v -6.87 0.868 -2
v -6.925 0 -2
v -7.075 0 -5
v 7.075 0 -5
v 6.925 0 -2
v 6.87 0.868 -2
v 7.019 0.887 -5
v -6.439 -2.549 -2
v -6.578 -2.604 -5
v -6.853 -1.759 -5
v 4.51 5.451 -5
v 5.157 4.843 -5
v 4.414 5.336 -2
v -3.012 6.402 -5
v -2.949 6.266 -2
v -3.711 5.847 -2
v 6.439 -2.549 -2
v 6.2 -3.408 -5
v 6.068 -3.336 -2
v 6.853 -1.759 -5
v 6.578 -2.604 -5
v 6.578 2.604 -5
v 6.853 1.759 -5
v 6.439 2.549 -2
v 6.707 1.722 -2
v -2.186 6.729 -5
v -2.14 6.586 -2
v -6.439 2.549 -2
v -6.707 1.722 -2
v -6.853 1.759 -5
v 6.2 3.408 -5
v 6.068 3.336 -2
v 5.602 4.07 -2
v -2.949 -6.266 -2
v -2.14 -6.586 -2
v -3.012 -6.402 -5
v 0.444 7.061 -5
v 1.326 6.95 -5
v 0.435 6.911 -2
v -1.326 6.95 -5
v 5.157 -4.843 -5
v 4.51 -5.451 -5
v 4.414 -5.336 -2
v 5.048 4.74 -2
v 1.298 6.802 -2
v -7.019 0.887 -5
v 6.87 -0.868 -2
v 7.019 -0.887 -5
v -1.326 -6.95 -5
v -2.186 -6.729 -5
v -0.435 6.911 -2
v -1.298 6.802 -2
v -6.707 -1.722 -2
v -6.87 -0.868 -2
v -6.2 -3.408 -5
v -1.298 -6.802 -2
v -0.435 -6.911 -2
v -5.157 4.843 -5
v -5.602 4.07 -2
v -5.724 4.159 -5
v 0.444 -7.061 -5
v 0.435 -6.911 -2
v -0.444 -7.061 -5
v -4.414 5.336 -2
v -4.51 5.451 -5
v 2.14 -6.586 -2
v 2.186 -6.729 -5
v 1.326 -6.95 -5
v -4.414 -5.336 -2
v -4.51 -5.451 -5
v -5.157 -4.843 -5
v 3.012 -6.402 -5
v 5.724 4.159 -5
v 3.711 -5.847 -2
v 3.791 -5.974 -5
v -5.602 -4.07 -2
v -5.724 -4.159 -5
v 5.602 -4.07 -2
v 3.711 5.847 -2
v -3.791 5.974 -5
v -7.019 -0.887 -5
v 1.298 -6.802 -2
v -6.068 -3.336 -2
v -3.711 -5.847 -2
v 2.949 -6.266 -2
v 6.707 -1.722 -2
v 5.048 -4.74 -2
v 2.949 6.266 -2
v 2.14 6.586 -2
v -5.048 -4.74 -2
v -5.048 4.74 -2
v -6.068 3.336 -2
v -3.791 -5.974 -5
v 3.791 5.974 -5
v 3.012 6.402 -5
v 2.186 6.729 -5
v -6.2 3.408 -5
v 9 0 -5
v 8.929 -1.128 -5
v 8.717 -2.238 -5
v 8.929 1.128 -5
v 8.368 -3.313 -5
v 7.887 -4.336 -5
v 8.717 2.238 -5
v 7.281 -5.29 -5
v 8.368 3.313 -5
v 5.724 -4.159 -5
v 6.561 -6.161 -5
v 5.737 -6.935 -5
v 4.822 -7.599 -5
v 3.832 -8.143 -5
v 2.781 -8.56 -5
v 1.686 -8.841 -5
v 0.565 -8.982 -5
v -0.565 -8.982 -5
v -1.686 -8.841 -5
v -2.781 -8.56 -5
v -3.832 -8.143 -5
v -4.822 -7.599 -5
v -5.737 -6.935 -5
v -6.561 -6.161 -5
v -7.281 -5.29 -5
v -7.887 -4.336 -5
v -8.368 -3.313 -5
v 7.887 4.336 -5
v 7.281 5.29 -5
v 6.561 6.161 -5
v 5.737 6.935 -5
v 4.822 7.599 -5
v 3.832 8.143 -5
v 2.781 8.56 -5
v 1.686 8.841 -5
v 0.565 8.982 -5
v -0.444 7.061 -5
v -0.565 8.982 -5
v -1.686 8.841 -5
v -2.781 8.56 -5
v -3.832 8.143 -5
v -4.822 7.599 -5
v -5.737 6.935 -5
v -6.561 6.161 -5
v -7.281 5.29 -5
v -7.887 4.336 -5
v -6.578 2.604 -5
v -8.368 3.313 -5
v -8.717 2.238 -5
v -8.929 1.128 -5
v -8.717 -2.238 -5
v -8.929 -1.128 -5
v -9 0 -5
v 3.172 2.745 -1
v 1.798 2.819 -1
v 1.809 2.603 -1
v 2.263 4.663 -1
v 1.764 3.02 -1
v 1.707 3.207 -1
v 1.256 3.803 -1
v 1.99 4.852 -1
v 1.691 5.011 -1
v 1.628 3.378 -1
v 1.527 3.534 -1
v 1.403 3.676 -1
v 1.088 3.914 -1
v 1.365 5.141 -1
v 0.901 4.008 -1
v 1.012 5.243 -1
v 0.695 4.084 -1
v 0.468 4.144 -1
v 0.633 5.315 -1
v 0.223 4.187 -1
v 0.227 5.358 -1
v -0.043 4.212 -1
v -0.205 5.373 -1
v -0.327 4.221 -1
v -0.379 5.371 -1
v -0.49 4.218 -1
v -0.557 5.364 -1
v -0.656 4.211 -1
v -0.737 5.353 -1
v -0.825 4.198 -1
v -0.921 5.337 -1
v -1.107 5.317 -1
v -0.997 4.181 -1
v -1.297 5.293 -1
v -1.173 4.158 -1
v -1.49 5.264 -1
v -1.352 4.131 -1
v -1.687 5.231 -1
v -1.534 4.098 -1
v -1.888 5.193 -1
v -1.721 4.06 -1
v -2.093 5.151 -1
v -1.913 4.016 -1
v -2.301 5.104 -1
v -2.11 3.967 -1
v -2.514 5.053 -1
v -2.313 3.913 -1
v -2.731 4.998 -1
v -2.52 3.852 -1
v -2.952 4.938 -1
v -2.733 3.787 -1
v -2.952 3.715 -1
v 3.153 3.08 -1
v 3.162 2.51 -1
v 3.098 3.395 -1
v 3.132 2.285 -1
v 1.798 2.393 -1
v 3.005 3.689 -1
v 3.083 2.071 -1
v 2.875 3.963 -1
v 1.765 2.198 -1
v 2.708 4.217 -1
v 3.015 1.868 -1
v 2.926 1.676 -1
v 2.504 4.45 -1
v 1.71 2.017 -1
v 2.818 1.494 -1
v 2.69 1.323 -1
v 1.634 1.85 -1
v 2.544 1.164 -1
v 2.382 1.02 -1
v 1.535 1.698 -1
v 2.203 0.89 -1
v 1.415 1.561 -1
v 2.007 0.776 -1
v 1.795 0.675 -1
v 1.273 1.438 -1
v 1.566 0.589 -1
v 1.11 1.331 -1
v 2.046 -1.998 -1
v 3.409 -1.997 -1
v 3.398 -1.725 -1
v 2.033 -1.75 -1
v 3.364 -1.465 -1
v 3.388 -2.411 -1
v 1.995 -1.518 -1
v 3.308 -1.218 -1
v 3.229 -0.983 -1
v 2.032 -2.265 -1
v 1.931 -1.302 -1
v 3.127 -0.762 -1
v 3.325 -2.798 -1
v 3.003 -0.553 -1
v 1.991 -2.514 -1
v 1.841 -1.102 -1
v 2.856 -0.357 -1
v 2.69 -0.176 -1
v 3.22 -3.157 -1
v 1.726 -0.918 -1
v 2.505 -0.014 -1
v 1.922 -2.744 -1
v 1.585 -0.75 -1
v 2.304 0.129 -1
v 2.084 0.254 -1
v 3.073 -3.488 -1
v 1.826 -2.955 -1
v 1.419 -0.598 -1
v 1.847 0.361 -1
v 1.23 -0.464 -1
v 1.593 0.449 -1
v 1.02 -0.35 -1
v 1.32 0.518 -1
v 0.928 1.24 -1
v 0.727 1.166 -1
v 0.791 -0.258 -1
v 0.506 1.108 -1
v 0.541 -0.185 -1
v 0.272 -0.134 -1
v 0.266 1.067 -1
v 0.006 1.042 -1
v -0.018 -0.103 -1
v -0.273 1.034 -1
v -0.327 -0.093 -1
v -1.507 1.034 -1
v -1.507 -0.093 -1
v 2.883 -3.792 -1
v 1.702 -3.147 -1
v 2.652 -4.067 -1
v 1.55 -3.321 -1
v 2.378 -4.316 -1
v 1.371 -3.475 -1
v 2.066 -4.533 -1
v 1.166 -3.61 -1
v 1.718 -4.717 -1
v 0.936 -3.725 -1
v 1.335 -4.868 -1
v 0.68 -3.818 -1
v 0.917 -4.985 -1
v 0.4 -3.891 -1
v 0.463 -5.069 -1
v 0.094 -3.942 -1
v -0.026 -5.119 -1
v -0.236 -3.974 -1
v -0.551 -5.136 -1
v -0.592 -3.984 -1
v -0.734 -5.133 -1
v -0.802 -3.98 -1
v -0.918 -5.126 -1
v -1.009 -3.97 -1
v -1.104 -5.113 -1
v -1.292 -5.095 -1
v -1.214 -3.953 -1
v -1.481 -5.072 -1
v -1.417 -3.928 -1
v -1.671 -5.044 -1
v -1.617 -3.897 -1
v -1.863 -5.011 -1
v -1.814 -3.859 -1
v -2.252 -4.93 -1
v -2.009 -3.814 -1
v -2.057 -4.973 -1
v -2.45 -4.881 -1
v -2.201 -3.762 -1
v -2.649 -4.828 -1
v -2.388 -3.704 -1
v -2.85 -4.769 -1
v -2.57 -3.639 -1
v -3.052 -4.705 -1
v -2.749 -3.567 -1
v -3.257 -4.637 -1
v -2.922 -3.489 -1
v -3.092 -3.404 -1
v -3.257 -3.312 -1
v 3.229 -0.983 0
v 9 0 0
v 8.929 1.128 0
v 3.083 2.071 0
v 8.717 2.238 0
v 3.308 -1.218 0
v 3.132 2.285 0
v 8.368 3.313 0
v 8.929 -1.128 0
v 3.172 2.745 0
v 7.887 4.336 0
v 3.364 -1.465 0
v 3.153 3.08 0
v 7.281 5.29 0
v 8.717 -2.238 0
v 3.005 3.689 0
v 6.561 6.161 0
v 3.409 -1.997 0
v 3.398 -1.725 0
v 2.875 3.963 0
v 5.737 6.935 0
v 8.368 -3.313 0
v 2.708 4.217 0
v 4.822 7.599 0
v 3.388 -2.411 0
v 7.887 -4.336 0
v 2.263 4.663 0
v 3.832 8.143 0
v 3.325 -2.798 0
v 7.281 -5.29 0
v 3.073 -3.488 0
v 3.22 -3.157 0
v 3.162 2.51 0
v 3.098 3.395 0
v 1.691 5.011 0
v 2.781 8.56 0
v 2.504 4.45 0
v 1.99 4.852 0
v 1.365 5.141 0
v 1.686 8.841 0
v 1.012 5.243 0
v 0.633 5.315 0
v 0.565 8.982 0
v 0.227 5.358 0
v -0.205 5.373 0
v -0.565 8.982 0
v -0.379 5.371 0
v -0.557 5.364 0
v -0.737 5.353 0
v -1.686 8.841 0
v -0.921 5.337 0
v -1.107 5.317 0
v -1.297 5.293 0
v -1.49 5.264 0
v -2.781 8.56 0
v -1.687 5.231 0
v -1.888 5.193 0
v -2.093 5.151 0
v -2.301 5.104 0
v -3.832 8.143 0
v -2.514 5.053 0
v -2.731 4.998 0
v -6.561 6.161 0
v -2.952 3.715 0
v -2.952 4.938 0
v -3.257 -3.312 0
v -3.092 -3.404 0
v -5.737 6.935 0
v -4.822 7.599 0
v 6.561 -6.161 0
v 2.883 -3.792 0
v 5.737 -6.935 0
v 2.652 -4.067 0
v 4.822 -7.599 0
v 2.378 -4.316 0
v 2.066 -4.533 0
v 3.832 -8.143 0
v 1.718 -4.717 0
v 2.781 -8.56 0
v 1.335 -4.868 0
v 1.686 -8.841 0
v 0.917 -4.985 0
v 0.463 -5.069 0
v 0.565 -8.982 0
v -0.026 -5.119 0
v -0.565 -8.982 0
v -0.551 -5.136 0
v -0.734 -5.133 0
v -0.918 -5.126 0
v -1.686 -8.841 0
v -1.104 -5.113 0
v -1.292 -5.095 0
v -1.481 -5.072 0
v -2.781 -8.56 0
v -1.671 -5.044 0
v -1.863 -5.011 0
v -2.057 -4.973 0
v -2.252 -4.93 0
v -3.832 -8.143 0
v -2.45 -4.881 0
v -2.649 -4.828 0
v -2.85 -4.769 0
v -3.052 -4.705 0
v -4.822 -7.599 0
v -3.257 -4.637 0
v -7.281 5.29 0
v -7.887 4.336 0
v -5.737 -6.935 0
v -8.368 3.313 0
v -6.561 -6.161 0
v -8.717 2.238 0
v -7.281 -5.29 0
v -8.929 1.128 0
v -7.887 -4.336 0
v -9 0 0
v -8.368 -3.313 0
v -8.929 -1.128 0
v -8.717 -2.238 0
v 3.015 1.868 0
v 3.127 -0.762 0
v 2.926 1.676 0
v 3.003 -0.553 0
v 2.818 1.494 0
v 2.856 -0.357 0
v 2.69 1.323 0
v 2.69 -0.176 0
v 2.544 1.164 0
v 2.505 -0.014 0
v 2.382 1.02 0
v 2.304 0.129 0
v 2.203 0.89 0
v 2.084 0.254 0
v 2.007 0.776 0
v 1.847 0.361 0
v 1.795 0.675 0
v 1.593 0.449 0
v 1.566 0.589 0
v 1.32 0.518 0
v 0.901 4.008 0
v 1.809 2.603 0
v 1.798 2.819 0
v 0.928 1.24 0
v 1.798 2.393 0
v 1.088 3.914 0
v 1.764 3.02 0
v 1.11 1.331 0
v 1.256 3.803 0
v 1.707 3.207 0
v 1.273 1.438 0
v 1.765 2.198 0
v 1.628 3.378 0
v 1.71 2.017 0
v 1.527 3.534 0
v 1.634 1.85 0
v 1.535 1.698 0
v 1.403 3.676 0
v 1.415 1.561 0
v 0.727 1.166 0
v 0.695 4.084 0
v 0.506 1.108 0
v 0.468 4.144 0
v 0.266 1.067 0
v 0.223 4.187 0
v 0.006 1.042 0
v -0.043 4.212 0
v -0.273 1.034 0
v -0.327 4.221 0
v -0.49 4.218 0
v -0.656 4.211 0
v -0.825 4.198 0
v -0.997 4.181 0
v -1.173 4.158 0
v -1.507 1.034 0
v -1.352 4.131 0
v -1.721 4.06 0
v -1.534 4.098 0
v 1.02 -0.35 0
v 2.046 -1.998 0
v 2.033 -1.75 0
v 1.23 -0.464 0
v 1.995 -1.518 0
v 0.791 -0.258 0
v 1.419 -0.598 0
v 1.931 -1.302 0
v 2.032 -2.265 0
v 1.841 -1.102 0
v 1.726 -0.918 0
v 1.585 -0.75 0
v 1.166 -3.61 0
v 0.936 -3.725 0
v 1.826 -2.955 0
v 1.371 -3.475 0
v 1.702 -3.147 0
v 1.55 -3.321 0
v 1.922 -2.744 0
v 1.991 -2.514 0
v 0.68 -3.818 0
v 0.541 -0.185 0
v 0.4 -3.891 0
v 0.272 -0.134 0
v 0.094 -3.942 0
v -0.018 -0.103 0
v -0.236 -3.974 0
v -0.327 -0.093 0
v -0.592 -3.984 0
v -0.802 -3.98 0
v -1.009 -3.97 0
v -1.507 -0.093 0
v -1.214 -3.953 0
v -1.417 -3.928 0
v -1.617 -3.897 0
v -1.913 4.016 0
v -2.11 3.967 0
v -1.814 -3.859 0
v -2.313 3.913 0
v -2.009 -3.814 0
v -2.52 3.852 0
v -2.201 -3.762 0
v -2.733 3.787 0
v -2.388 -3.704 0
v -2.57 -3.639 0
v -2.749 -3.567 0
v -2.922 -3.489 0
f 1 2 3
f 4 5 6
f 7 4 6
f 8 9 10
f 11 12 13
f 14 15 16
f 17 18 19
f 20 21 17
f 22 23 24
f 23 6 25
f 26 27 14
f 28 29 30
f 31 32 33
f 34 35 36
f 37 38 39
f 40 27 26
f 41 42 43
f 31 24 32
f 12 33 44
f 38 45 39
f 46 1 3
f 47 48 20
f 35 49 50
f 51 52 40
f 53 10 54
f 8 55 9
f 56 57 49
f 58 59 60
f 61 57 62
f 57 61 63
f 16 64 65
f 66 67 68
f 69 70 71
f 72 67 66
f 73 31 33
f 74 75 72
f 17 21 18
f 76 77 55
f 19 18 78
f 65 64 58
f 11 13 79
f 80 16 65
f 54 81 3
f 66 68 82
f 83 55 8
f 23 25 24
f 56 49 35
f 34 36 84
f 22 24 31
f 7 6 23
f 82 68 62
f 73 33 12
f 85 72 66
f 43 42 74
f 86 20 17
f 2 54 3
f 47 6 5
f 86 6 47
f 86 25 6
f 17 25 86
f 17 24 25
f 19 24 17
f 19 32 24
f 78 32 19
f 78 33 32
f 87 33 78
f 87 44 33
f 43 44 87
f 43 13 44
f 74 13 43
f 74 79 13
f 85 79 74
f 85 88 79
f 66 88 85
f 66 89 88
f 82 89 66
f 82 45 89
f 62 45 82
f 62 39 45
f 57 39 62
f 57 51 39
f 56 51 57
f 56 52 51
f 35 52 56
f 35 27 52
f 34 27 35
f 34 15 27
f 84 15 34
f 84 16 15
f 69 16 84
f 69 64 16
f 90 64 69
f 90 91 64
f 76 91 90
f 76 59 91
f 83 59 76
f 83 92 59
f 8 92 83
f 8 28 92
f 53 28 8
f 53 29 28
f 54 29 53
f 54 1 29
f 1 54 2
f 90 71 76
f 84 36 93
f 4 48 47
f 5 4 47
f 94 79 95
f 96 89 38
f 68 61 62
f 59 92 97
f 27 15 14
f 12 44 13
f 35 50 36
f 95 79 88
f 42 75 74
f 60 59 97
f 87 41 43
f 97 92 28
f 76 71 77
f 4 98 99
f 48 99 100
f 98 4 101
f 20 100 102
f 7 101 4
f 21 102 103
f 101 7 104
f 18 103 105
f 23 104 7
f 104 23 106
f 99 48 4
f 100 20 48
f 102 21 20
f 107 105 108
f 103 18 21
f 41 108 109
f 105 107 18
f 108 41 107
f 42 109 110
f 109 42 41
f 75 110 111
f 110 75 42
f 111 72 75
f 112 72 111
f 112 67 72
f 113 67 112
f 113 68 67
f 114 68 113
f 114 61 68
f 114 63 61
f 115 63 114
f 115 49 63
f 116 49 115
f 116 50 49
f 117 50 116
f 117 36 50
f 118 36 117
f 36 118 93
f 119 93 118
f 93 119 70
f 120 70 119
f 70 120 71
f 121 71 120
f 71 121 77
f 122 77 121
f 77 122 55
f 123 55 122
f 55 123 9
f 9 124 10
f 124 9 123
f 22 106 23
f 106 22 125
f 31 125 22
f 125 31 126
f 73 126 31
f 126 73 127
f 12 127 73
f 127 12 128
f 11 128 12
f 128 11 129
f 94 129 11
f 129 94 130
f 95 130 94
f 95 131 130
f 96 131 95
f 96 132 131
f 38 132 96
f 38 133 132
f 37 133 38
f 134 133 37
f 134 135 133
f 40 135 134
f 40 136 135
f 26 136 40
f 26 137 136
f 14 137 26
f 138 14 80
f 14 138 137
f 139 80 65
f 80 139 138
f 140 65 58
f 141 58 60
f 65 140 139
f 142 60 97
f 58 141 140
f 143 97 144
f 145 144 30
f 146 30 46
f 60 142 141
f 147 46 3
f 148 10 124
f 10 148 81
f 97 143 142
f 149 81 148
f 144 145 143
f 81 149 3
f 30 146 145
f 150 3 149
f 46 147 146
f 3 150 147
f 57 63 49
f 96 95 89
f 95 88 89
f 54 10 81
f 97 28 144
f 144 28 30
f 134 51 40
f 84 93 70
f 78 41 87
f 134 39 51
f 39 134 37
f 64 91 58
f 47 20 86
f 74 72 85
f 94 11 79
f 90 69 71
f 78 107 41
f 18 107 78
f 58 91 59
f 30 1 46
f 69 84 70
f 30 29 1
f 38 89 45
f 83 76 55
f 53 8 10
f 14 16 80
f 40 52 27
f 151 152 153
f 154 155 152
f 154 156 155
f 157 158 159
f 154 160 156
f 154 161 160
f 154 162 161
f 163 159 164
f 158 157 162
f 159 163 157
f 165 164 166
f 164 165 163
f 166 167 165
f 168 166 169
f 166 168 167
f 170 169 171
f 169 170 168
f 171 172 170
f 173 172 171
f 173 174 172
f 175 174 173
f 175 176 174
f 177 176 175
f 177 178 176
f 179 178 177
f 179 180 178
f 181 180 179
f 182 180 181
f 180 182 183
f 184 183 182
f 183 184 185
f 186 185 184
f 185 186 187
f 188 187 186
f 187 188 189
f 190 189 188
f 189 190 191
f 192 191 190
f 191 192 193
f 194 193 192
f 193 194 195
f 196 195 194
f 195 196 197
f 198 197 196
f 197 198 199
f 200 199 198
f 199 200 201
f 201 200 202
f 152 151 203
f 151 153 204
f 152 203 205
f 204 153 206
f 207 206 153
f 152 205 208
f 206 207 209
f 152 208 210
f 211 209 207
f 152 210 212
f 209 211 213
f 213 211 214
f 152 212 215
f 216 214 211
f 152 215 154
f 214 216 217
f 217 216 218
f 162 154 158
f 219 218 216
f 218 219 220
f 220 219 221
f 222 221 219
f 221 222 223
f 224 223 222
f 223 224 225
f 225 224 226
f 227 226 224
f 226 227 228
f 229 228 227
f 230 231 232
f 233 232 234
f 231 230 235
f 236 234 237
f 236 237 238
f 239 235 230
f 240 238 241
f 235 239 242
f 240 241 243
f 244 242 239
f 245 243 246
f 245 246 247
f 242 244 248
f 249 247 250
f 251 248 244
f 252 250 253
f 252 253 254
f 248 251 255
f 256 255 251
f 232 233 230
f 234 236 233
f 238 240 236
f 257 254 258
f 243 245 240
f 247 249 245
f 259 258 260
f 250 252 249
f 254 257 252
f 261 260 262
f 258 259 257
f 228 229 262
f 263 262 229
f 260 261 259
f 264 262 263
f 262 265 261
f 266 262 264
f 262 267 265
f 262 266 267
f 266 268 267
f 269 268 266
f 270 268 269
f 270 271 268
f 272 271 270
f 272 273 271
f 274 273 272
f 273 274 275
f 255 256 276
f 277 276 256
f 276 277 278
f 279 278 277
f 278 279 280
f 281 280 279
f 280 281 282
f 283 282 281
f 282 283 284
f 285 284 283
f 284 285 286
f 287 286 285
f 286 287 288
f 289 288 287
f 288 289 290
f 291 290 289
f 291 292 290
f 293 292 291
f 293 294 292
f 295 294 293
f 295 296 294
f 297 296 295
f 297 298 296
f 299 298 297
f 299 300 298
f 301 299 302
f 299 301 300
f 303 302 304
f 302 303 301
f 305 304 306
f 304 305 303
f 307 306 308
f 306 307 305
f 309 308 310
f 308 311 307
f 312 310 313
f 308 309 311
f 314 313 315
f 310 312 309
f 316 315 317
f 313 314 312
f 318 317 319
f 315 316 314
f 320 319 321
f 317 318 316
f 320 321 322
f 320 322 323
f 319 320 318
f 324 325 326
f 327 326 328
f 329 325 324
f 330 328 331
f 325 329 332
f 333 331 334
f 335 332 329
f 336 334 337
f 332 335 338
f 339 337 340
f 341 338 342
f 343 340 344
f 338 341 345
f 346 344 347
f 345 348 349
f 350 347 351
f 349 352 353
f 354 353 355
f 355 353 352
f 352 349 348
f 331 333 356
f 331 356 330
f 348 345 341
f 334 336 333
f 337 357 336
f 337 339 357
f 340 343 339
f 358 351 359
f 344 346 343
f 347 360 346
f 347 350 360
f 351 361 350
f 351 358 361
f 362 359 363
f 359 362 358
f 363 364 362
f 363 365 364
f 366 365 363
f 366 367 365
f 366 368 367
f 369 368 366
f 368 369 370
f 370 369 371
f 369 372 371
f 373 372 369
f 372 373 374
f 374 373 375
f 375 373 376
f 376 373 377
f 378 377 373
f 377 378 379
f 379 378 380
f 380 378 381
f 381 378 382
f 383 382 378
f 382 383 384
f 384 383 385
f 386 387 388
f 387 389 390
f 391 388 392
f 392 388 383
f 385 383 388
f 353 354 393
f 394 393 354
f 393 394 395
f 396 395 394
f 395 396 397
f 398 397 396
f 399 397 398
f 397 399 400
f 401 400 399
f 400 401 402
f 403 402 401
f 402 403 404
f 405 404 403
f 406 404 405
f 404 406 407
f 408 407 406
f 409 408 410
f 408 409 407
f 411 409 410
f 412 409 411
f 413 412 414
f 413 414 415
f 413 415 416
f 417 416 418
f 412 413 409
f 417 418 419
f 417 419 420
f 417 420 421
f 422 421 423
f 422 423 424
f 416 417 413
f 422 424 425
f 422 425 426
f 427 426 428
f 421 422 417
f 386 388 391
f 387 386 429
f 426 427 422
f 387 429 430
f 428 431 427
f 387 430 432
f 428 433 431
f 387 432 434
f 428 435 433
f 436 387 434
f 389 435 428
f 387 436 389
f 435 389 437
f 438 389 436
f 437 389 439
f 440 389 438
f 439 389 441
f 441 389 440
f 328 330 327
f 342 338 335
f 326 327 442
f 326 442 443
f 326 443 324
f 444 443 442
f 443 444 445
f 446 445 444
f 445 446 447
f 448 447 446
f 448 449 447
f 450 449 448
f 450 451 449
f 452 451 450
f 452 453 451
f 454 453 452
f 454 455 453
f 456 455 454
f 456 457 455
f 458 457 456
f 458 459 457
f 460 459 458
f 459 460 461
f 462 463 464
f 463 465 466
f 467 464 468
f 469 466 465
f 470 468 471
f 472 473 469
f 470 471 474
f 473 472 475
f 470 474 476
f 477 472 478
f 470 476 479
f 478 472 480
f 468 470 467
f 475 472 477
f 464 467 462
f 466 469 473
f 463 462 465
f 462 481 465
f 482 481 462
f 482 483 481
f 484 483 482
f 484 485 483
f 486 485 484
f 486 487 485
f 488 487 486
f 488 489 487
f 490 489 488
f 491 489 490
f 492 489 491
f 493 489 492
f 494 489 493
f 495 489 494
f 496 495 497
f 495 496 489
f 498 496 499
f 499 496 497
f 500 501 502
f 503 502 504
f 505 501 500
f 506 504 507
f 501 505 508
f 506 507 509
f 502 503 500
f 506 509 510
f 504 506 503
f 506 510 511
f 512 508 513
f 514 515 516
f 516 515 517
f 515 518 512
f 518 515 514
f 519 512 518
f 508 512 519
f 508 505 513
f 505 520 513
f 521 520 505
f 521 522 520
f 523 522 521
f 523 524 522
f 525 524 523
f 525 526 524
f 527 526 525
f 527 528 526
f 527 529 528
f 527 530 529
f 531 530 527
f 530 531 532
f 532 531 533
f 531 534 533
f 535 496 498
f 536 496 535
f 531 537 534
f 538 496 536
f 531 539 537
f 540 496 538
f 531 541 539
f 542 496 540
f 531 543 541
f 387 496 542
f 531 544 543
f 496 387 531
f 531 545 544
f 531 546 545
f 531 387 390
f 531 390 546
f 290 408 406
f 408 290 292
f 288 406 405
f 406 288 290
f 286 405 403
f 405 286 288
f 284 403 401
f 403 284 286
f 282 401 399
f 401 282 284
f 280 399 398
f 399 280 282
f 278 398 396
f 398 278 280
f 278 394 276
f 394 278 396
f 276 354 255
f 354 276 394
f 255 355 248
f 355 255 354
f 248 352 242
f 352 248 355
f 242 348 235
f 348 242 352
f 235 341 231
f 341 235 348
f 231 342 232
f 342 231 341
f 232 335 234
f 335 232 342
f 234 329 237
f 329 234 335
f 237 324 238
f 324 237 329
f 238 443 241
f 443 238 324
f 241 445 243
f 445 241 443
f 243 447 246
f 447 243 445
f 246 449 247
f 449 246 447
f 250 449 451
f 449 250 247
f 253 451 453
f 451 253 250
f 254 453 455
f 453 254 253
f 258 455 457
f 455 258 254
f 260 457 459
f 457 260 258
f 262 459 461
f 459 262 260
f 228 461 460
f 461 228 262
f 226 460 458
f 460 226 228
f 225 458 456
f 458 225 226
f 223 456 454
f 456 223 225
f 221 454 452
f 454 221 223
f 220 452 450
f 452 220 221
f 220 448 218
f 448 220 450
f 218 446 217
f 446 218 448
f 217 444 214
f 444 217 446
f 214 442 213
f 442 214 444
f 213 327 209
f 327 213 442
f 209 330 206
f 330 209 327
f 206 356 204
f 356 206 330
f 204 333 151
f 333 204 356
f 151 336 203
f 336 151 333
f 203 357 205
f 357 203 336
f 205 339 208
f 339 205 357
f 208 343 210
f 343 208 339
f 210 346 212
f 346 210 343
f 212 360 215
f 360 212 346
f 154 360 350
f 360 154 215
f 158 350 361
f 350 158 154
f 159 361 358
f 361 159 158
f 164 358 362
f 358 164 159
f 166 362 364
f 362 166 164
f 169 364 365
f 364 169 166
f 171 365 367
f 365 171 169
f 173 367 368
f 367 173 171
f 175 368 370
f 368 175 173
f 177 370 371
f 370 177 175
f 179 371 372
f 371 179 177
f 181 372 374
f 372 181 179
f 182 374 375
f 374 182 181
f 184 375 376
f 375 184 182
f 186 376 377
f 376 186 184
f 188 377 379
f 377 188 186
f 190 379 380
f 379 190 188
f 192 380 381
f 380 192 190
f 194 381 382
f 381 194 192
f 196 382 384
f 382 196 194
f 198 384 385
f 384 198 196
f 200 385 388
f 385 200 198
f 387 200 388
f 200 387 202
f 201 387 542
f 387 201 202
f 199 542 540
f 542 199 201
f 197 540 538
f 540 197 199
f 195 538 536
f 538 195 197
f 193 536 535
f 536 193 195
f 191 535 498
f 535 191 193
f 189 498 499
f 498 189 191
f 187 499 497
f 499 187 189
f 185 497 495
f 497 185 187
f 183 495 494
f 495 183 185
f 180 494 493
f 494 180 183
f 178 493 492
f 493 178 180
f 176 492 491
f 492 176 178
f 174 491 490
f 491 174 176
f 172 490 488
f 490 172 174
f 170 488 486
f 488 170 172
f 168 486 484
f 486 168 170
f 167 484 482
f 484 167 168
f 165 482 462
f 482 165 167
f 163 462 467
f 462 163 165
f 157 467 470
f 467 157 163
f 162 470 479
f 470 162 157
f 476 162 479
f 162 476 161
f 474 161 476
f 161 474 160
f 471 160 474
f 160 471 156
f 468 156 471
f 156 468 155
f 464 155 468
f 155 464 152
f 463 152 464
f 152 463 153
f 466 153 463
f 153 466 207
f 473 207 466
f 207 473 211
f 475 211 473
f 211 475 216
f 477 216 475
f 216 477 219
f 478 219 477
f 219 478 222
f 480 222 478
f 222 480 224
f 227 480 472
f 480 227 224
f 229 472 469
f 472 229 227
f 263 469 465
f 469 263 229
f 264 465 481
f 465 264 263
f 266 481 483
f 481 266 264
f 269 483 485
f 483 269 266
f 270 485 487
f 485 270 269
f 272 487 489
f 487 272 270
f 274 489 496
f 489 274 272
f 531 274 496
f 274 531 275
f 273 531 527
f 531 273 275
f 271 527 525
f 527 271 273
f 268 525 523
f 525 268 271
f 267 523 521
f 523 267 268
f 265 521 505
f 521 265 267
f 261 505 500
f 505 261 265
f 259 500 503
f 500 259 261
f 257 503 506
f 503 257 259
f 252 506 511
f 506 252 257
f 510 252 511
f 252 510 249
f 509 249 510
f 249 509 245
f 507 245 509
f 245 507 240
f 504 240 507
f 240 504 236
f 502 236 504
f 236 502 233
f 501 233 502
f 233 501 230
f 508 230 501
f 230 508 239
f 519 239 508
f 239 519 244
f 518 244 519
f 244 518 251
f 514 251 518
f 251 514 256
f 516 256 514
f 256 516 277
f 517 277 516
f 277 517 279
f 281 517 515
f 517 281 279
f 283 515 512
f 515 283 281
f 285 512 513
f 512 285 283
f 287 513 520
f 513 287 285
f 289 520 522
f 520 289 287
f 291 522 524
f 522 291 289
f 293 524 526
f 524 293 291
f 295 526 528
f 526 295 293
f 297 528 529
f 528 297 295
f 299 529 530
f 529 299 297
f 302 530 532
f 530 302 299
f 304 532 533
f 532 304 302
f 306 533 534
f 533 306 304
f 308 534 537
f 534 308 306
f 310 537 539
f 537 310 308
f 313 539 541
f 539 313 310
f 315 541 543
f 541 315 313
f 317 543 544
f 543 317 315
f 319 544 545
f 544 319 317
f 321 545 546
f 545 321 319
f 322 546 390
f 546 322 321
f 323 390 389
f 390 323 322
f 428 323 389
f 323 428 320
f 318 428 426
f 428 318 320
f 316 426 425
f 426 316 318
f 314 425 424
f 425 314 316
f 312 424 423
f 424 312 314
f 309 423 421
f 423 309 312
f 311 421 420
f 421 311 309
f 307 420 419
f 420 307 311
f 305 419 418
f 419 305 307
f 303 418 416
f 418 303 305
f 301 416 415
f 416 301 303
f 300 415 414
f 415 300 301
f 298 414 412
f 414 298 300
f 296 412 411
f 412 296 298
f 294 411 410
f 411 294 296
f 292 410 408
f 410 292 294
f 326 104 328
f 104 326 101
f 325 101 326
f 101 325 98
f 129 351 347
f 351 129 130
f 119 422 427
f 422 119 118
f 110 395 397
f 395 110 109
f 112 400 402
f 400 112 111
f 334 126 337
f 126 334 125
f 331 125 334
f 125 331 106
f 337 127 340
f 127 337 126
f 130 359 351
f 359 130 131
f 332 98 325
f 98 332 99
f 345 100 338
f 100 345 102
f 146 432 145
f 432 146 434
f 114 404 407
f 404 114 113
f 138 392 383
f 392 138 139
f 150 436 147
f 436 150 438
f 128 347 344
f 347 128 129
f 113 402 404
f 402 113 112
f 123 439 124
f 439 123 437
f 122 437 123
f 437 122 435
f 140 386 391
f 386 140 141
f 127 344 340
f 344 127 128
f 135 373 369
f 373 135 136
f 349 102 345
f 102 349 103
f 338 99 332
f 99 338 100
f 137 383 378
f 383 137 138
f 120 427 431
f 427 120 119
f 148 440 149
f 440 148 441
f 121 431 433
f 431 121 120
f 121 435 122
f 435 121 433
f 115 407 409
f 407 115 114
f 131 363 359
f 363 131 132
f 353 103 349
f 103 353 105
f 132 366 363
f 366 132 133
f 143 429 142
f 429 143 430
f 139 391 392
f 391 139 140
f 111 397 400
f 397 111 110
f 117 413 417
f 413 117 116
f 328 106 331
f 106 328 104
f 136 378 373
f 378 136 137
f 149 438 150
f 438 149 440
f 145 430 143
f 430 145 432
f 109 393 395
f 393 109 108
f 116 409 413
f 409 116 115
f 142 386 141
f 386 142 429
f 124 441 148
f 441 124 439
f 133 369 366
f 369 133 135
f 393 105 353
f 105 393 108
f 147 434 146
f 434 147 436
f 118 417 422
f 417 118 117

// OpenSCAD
$fn = 50;


difference() {
	union() {
		translate(v = [0, 0, -5.0000000000]) {
			cylinder(h = 5, r = 9.0000000000);
		}
	}
	union() {
		#translate(v = [0, 0, -5.0000000000]) {
			cylinder(h = 3, r1 = 7.0750000000, r2 = 6.9250000000);
		}
		translate(v = [0, 0, -1]) {
			linear_extrude(height = 1) {
				text(font = "Impact", halign = "center", size = 10, text = "3", valign = "center");
			}
		}
	}
}
